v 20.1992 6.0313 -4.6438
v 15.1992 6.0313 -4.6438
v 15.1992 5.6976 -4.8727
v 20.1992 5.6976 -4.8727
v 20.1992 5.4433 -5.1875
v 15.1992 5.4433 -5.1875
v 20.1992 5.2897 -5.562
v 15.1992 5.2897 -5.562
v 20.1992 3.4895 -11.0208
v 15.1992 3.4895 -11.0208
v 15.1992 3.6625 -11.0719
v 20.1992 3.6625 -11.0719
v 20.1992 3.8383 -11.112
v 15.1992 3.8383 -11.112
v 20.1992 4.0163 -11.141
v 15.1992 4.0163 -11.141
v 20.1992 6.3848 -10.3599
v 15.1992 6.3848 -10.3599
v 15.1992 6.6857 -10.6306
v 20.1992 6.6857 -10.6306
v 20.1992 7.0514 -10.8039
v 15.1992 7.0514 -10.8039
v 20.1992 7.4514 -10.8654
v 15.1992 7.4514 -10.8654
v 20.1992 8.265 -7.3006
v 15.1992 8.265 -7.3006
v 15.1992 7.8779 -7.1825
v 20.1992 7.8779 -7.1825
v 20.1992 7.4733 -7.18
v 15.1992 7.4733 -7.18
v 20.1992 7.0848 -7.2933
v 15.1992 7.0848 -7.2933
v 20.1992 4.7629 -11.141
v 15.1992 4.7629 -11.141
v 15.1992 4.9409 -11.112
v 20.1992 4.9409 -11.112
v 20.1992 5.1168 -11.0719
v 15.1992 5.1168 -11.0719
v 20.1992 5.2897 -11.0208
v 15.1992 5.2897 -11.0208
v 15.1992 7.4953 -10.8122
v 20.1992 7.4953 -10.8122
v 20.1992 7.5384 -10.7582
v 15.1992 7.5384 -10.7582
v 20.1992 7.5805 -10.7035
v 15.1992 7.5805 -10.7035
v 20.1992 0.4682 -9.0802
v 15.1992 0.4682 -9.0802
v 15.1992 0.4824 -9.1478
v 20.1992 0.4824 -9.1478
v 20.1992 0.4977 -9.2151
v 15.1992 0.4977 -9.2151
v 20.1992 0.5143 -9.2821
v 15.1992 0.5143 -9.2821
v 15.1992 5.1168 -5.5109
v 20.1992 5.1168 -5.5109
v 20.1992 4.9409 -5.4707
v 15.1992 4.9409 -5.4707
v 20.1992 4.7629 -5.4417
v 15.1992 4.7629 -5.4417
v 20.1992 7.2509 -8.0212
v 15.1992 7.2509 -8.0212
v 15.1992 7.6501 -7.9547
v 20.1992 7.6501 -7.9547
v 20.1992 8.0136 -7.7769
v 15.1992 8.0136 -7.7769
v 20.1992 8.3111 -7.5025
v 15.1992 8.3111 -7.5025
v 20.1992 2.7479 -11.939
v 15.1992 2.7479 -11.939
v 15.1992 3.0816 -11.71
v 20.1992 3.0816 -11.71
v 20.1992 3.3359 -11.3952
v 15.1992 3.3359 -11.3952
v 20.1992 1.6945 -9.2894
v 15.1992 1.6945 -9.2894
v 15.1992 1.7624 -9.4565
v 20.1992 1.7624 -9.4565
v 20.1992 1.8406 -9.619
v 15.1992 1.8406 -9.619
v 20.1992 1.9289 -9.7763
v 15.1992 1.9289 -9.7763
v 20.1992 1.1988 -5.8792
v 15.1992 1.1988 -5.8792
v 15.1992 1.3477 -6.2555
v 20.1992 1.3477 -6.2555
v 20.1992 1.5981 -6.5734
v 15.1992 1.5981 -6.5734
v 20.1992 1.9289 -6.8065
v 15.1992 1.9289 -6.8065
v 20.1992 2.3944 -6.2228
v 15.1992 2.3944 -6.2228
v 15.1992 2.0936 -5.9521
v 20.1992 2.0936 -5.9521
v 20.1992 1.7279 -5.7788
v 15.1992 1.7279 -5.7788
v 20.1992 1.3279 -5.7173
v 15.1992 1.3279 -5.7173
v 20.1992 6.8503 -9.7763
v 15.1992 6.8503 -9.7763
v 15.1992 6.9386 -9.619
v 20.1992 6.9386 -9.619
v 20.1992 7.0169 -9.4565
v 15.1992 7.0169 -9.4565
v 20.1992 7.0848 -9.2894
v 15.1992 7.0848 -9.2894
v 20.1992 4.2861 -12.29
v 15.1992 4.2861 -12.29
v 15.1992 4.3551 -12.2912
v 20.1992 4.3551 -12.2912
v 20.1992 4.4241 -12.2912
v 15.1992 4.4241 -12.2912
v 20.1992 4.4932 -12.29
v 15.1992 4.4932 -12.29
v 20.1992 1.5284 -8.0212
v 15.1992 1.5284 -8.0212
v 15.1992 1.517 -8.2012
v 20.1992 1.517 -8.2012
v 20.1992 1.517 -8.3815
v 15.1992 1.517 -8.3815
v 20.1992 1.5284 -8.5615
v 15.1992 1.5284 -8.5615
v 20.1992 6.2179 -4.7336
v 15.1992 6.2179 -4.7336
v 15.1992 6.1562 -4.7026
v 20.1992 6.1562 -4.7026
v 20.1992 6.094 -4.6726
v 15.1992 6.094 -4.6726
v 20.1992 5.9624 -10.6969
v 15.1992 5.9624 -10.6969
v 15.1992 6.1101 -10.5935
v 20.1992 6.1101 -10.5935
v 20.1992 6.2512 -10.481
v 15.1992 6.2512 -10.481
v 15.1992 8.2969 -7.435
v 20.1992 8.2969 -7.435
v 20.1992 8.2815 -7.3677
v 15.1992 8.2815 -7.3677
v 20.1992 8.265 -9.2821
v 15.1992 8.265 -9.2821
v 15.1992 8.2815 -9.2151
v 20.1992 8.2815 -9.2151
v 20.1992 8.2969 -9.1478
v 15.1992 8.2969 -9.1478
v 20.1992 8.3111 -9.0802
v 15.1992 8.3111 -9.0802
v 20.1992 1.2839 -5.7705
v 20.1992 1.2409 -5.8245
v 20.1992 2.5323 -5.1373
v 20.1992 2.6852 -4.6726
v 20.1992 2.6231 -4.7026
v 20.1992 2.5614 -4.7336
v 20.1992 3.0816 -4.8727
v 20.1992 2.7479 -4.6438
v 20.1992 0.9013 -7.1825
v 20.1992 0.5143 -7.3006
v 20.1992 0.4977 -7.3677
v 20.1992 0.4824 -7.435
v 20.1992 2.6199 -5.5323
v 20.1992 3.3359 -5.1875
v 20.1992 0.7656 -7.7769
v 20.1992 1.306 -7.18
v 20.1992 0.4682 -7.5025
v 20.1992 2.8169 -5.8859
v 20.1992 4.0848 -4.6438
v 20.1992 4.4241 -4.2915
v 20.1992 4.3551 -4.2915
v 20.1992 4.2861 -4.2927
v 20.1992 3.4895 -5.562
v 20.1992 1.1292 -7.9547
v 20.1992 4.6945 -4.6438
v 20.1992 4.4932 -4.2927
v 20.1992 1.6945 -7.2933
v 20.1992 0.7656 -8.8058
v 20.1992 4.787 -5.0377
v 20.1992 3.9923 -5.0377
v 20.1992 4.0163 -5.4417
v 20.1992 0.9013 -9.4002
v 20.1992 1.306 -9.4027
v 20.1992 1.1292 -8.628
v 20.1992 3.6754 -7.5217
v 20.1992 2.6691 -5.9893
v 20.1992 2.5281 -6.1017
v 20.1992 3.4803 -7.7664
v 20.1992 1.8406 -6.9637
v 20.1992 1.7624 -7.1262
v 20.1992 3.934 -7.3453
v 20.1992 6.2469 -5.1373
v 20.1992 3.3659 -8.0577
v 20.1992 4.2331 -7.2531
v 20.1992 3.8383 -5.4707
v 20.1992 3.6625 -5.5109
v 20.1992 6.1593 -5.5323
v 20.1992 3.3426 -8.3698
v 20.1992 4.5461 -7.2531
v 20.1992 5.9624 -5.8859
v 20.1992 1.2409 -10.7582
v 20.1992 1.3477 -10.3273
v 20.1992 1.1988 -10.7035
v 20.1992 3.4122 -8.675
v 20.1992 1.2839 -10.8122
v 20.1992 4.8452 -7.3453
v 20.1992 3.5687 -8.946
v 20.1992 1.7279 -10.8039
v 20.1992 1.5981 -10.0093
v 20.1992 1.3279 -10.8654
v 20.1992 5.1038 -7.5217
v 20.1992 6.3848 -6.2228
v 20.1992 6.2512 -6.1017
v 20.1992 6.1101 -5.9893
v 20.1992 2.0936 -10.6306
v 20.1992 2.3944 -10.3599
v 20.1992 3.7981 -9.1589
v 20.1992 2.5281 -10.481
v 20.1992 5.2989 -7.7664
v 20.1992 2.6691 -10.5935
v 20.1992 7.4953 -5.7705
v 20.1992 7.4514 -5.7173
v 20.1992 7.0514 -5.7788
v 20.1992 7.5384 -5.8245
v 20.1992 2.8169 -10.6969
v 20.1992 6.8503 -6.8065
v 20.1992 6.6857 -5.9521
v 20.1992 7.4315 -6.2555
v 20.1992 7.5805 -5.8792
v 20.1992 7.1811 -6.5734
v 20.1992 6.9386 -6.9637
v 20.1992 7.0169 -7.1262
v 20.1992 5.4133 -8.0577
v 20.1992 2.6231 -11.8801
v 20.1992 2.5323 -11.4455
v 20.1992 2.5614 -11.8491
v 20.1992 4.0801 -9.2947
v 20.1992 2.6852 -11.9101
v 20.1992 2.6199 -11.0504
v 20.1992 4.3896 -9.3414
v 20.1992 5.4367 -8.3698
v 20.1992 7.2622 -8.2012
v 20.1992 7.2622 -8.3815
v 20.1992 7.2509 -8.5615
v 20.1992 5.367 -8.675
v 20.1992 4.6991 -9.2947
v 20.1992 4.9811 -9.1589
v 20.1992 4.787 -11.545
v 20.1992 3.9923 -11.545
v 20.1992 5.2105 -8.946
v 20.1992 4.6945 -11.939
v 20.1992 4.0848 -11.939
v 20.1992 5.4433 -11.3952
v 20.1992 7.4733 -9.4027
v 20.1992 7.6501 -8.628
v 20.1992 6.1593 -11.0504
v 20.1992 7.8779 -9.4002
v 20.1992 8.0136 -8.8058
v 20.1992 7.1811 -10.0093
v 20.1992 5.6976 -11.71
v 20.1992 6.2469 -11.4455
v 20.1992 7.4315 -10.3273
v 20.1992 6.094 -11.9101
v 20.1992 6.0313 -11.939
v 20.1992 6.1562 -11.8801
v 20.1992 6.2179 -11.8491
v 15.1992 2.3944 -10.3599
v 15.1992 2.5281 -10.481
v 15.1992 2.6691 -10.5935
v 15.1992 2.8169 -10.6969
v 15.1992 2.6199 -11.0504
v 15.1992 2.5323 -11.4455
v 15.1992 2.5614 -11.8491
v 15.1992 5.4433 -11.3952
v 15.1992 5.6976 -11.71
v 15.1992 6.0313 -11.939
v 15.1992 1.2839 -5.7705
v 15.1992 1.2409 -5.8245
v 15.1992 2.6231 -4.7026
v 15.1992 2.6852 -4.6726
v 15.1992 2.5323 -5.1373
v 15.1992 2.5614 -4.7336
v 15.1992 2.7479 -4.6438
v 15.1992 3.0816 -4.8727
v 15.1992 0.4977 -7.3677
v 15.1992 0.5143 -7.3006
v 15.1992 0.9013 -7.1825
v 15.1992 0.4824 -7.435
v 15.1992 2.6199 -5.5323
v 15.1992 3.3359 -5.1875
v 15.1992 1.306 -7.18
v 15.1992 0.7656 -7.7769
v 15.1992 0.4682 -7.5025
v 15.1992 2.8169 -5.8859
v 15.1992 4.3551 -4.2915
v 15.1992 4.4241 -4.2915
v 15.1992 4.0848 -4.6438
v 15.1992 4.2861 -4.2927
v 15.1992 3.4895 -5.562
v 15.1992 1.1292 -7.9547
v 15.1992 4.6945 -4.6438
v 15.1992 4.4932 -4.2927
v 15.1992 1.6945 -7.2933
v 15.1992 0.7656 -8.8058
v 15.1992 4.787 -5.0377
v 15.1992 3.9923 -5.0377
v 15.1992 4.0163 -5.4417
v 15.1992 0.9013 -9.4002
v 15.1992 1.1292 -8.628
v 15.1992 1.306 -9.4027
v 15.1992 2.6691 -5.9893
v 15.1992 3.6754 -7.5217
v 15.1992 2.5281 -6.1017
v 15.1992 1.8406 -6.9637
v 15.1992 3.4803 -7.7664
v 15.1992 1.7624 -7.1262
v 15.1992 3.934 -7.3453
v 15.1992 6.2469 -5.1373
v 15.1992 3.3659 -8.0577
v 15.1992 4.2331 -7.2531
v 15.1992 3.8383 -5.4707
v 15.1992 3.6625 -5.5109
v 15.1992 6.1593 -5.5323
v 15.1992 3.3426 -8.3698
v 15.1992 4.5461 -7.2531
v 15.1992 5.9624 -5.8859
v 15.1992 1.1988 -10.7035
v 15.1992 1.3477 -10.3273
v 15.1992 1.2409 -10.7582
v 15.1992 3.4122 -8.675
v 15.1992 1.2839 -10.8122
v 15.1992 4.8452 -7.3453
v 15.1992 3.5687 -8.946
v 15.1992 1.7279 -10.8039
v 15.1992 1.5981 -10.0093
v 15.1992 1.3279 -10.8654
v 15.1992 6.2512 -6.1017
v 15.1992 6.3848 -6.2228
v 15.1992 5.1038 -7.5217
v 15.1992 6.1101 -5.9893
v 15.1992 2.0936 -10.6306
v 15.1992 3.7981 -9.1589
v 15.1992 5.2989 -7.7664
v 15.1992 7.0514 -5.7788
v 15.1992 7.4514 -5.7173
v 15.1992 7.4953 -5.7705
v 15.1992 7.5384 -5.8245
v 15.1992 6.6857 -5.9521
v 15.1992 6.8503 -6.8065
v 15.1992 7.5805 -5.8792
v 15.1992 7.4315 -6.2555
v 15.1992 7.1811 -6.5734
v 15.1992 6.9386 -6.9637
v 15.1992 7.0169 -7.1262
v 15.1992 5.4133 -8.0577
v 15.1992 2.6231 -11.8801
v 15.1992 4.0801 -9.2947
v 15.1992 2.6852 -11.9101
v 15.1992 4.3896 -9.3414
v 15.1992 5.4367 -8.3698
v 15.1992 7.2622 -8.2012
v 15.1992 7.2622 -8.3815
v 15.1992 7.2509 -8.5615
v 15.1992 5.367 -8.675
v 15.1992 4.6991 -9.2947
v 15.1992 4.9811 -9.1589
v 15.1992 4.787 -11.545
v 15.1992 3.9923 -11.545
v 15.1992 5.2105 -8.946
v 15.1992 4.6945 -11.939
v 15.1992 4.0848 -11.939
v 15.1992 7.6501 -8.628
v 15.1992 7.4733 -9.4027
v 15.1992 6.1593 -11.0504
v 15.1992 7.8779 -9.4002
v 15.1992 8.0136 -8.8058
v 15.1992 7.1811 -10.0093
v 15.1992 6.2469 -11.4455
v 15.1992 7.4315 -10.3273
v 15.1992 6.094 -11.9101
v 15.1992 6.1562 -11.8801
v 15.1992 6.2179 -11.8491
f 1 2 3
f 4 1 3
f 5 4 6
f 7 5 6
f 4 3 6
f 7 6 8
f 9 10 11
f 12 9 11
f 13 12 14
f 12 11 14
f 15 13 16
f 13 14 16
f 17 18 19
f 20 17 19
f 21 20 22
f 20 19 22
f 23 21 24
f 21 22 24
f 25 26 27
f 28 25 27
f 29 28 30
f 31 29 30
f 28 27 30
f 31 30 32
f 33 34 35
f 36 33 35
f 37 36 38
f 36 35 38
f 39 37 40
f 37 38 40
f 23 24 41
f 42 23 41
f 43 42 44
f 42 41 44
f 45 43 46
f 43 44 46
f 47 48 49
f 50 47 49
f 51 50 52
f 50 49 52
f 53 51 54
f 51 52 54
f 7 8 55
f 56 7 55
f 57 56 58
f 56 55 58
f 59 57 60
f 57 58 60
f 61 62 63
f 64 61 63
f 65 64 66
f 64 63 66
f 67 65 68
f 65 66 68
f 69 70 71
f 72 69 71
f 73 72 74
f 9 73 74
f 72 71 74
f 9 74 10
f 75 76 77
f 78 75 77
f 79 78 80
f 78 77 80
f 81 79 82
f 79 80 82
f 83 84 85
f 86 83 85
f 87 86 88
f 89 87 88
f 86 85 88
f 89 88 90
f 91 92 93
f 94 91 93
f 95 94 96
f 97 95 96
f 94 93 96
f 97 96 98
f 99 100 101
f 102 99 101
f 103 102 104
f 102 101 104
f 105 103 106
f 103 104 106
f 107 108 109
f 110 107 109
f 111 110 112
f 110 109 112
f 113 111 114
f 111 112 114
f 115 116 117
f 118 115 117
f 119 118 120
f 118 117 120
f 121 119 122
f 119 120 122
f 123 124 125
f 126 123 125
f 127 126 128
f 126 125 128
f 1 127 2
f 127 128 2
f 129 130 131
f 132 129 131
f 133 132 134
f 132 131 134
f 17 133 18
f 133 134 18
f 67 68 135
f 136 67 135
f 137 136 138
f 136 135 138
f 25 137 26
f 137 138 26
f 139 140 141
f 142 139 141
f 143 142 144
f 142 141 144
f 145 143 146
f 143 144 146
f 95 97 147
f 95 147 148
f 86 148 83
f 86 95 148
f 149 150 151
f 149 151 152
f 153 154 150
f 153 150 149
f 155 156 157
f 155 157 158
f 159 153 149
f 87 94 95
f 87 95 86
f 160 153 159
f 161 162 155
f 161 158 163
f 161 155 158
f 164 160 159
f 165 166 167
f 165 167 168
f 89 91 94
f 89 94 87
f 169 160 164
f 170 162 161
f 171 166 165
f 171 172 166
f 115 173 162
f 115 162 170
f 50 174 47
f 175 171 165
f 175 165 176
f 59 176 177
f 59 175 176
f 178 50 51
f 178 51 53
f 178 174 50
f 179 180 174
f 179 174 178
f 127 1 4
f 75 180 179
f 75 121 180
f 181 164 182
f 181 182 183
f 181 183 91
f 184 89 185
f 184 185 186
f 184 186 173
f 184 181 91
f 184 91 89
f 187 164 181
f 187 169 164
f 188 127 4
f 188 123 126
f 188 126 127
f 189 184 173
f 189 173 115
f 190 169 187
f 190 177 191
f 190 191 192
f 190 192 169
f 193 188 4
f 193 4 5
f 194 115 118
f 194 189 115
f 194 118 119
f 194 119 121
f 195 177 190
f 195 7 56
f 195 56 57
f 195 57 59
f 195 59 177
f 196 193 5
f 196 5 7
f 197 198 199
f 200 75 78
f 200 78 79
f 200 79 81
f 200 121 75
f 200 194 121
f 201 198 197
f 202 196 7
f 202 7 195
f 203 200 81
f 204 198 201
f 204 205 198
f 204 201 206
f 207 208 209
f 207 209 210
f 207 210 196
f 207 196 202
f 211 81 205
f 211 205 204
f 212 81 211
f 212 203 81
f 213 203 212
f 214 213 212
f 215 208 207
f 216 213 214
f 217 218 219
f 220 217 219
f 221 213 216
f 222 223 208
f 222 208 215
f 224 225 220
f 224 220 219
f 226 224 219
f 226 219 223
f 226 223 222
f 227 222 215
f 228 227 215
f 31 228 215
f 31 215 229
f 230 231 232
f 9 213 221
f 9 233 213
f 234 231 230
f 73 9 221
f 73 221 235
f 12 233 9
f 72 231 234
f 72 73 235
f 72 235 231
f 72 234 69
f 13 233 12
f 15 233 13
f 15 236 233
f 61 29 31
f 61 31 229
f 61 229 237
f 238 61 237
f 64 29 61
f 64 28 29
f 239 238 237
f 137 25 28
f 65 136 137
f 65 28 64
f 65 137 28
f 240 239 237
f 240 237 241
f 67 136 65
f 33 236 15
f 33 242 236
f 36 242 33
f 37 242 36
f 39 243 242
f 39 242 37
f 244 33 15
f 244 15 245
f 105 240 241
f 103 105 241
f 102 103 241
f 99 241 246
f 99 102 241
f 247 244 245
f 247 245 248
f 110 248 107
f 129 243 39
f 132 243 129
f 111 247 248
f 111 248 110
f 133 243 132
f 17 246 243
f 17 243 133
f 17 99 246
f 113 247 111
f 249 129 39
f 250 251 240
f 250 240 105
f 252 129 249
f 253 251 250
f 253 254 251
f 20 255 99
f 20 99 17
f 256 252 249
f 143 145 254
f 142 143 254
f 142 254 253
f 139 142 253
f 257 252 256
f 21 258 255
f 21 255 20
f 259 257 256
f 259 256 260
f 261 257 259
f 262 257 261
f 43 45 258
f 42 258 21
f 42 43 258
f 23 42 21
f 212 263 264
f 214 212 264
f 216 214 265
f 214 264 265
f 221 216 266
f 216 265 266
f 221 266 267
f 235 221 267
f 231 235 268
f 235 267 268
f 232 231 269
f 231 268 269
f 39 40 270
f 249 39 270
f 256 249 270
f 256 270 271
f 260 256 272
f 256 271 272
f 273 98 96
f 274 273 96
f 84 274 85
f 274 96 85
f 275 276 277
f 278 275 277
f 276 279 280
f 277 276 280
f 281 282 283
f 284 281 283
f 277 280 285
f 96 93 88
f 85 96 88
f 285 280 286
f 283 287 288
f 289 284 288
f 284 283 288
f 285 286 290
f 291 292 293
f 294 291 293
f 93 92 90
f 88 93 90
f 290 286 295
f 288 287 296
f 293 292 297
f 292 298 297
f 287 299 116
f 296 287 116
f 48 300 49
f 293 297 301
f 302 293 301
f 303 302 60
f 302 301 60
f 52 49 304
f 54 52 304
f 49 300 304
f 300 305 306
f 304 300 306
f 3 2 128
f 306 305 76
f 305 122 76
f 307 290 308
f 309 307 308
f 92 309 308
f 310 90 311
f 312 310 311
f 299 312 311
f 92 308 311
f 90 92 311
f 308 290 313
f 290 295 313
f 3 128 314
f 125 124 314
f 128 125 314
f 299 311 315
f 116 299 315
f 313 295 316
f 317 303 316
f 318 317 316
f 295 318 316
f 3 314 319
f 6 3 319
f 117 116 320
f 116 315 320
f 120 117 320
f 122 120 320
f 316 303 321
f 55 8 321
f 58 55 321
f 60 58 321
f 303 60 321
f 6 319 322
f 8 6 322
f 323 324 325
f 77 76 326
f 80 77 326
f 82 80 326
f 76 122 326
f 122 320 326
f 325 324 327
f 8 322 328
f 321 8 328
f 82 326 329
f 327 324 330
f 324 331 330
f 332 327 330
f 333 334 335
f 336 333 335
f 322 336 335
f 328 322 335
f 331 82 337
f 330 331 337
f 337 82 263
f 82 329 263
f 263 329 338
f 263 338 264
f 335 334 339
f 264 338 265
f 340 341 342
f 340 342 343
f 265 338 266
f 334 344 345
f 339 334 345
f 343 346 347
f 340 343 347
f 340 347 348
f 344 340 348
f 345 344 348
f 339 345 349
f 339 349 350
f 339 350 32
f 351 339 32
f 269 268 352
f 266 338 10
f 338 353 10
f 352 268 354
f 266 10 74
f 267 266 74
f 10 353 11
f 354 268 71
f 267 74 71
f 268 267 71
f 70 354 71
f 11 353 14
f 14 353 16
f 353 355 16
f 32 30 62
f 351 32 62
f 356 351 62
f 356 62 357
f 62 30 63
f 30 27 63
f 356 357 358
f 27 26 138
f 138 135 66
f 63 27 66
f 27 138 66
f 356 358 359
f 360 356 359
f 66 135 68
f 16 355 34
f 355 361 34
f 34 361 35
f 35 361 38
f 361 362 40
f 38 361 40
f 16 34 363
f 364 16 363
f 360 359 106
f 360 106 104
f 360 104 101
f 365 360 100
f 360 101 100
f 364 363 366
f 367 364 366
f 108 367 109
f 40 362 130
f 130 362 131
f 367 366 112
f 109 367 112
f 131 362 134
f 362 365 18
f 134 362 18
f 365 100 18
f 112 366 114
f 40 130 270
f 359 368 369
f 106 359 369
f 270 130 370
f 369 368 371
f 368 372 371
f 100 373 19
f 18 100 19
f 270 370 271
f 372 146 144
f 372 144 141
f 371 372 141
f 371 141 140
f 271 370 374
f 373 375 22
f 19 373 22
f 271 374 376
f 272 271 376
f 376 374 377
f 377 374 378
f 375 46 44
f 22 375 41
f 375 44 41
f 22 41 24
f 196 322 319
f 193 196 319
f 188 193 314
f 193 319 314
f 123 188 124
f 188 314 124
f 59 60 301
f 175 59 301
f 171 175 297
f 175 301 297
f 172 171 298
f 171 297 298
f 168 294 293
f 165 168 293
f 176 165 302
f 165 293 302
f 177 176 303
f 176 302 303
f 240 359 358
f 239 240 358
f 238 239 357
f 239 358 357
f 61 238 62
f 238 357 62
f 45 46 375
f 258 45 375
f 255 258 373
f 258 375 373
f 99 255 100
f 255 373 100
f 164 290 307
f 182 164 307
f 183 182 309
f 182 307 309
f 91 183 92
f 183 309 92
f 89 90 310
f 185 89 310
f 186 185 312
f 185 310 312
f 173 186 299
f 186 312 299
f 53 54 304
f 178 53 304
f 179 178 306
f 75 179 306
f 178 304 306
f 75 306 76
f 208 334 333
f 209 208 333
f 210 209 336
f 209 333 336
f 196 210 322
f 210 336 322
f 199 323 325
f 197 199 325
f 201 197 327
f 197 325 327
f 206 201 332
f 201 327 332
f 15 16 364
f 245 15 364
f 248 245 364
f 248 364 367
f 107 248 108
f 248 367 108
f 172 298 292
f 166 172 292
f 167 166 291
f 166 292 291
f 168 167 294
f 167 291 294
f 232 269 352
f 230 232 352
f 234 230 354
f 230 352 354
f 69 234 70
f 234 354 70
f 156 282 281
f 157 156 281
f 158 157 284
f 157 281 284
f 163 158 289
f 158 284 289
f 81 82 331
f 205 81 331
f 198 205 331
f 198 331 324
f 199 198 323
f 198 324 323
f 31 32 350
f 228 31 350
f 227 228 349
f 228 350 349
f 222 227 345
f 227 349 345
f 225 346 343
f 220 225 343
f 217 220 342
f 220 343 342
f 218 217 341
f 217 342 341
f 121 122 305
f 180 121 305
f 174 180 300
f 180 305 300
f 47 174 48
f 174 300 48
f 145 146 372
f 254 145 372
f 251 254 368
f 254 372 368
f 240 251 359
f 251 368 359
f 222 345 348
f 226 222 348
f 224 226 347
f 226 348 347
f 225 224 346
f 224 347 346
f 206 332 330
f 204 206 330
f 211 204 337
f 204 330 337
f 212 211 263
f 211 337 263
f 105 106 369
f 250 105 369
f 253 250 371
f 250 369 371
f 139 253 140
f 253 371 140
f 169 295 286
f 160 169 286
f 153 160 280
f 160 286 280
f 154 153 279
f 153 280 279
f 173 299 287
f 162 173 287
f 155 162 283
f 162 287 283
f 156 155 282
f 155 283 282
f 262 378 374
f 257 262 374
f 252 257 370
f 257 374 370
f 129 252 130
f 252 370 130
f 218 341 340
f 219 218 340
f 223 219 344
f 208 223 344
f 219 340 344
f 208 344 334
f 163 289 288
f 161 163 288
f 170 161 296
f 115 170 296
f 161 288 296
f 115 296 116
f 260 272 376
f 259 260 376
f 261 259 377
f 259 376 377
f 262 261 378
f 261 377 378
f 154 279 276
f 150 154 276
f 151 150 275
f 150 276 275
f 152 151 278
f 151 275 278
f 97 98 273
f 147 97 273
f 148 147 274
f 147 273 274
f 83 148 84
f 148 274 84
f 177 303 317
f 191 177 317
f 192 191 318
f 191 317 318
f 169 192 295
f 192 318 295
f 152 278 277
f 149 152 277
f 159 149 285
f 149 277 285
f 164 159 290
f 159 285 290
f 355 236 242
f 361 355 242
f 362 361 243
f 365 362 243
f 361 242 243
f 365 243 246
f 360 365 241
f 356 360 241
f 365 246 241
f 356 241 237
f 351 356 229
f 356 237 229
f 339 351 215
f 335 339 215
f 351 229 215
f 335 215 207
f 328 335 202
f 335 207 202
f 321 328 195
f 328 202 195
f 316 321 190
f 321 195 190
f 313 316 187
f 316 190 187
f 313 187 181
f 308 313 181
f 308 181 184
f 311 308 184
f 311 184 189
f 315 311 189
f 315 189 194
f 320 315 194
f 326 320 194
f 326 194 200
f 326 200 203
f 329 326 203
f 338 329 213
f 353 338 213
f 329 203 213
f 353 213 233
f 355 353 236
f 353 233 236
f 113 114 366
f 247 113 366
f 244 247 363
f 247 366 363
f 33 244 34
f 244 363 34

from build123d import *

# Parameters (mm, degrees)
SPUR_START             = 15.199213342
SPUR_GEAR_AM_OUTLINE_R = 2.5
SPUR_GEAR_AM_DEPTH     = 5
SKETCH9_R              = 2.5
SKETCH9_R_2            = 1.05
BOSS_EXTRUDE1_DEPTH    = 5


# Read off the part's stored shape, not the designer's step: spur gear_am
with BuildPart() as part:
    # spur gear_am outline → spur gear_am (new body)
    with BuildSketch(Plane.YZ.offset(SPUR_START)):
        with BuildLine():
            ThreePointArc((2.747947228, -4.643773619), (2.654088149, -4.687486435), (2.561391914, -4.733613923))
            ThreePointArc((2.561391914, -4.733613923), (2.561783739, -5.337982285), (2.816889806, -5.88587111))
            ThreePointArc((2.816889806, -5.88587111), (2.597713415, -6.044378226), (2.394409068, -6.222788256))
            ThreePointArc((2.394409068, -6.222788256), (1.9170234, -5.852161498), (1.327895004, -5.717294884))
            ThreePointArc((1.327895004, -5.717294884), (1.262297175, -5.797402699), (1.198794721, -5.879181519))
            ThreePointArc((1.198794721, -5.879181519), (1.461373347, -6.423528591), (1.928936024, -6.806472991))
            ThreePointArc((1.928936024, -6.806472991), (1.800238579, -7.04438004), (1.694476903, -7.293332374))
            ThreePointArc((1.694476903, -7.293332374), (1.103558354, -7.166539081), (0.514255579, -7.300641692))
            ThreePointArc((0.514255579, -7.300641692), (0.489911456, -7.401278171), (0.468180222, -7.502511024))
            ThreePointArc((0.468180222, -7.502511024), (0.940938733, -7.879022193), (1.528351497, -8.021175333))
            ThreePointArc((1.528351497, -8.021175333), (1.515623105, -8.291361907), (1.528351497, -8.56154848))
            ThreePointArc((1.528351497, -8.56154848), (0.940938733, -8.70370162), (0.468180222, -9.080212789))
            ThreePointArc((0.468180222, -9.080212789), (0.489911456, -9.181445642), (0.514255579, -9.28208212))
            ThreePointArc((0.514255579, -9.28208212), (1.103558354, -9.416184732), (1.694476903, -9.289391439))
            ThreePointArc((1.694476903, -9.289391439), (1.800238579, -9.538343772), (1.928936024, -9.776250821))
            ThreePointArc((1.928936024, -9.776250821), (1.461373347, -10.159195221), (1.198794721, -10.703542294))
            ThreePointArc((1.198794721, -10.703542294), (1.262297175, -10.785321114), (1.327895004, -10.865428928))
            ThreePointArc((1.327895004, -10.865428928), (1.9170234, -10.730562315), (2.394409068, -10.359935556))
            ThreePointArc((2.394409068, -10.359935556), (2.597713414, -10.538345587), (2.816889806, -10.696852703))
            ThreePointArc((2.816889806, -10.696852703), (2.561783739, -11.244741528), (2.561391914, -11.84910989))
            ThreePointArc((2.561391914, -11.84910989), (2.654088149, -11.895237378), (2.747947228, -11.938950194))
            ThreePointArc((2.747947228, -11.938950194), (3.220217142, -11.561826343), (3.489517843, -11.020773293))
            ThreePointArc((3.489517843, -11.020773293), (3.750097941, -11.093304726), (4.016342706, -11.14101763))
            ThreePointArc((4.016342706, -11.14101763), (4.024220134, -11.745334779), (4.286092716, -12.290021864))
            ThreePointArc((4.286092716, -12.290021864), (4.389623105, -12.291361906), (4.493153494, -12.290021864))
            ThreePointArc((4.493153494, -12.290021864), (4.755026076, -11.745334779), (4.762903504, -11.14101763))
            ThreePointArc((4.762903504, -11.14101763), (5.029148269, -11.093304726), (5.289728367, -11.020773293))
            ThreePointArc((5.289728367, -11.020773293), (5.559029068, -11.561826343), (6.031298982, -11.938950194))
            ThreePointArc((6.031298982, -11.938950194), (6.125158061, -11.895237378), (6.217854296, -11.84910989))
            ThreePointArc((6.217854296, -11.84910989), (6.217462471, -11.244741528), (5.962356404, -10.696852703))
            ThreePointArc((5.962356404, -10.696852703), (6.181532796, -10.538345587), (6.384837142, -10.359935556))
            ThreePointArc((6.384837142, -10.359935556), (6.86222281, -10.730562315), (7.451351206, -10.865428928))
            ThreePointArc((7.451351206, -10.865428928), (7.516949035, -10.785321114), (7.580451489, -10.703542294))
            ThreePointArc((7.580451489, -10.703542294), (7.317872863, -10.159195221), (6.850310186, -9.776250821))
            ThreePointArc((6.850310186, -9.776250821), (6.979007631, -9.538343772), (7.084769307, -9.289391439))
            ThreePointArc((7.084769307, -9.289391439), (7.675687856, -9.416184732), (8.26499063, -9.28208212))
            ThreePointArc((8.26499063, -9.28208212), (8.289334754, -9.181445642), (8.311065988, -9.080212789))
            ThreePointArc((8.311065988, -9.080212789), (7.838307477, -8.70370162), (7.250894713, -8.56154848))
            ThreePointArc((7.250894713, -8.56154848), (7.263623105, -8.291361907), (7.250894713, -8.021175333))
            ThreePointArc((7.250894713, -8.021175333), (7.838307477, -7.879022193), (8.311065988, -7.502511024))
            ThreePointArc((8.311065988, -7.502511024), (8.289334754, -7.40127817), (8.26499063, -7.300641692))
            ThreePointArc((8.26499063, -7.300641692), (7.675687856, -7.166539081), (7.084769307, -7.293332374))
            ThreePointArc((7.084769307, -7.293332374), (6.979007631, -7.04438004), (6.850310186, -6.806472991))
            ThreePointArc((6.850310186, -6.806472991), (7.317872863, -6.423528591), (7.580451489, -5.879181519))
            ThreePointArc((7.580451489, -5.879181519), (7.516949035, -5.797402699), (7.451351206, -5.717294884))
            ThreePointArc((7.451351206, -5.717294884), (6.86222281, -5.852161498), (6.384837142, -6.222788256))
            ThreePointArc((6.384837142, -6.222788256), (6.181532795, -6.044378226), (5.962356404, -5.88587111))
            ThreePointArc((5.962356404, -5.88587111), (6.217462471, -5.337982285), (6.217854296, -4.733613923))
            ThreePointArc((6.217854296, -4.733613923), (6.125158061, -4.687486435), (6.031298982, -4.643773619))
            ThreePointArc((6.031298982, -4.643773619), (5.559029068, -5.02089747), (5.289728367, -5.56195052))
            ThreePointArc((5.289728367, -5.56195052), (5.029148269, -5.489419087), (4.762903504, -5.441706183))
            ThreePointArc((4.762903504, -5.441706183), (4.755026076, -4.837389034), (4.493153494, -4.292701948))
            ThreePointArc((4.493153494, -4.292701948), (4.389623105, -4.291361906), (4.286092716, -4.292701948))
            ThreePointArc((4.286092716, -4.292701948), (4.024220134, -4.837389034), (4.016342706, -5.441706183))
            ThreePointArc((4.016342706, -5.441706183), (3.750097941, -5.489419087), (3.489517843, -5.56195052))
            ThreePointArc((3.489517843, -5.56195052), (3.220217142, -5.02089747), (2.747947228, -4.643773619))
        make_face()
        with Locations((4.389623105, -8.291361906)):
            Circle(SPUR_GEAR_AM_OUTLINE_R, mode=Mode.SUBTRACT)
    extrude(amount=SPUR_GEAR_AM_DEPTH)

    # Sketch9 → Boss-Extrude1 (add, through all)
    with BuildSketch(Plane(origin=(20.199213342, 0, 0), x_dir=(0, 0, -1), z_dir=(1, 0, 0))):
        with Locations((8.291361906, 4.389623105)):
            Circle(SKETCH9_R)
        with Locations((8.291361906, 4.389623105)):
            Circle(SKETCH9_R_2, mode=Mode.SUBTRACT)
    extrude(amount=-BOSS_EXTRUDE1_DEPTH)


solid = part.part
